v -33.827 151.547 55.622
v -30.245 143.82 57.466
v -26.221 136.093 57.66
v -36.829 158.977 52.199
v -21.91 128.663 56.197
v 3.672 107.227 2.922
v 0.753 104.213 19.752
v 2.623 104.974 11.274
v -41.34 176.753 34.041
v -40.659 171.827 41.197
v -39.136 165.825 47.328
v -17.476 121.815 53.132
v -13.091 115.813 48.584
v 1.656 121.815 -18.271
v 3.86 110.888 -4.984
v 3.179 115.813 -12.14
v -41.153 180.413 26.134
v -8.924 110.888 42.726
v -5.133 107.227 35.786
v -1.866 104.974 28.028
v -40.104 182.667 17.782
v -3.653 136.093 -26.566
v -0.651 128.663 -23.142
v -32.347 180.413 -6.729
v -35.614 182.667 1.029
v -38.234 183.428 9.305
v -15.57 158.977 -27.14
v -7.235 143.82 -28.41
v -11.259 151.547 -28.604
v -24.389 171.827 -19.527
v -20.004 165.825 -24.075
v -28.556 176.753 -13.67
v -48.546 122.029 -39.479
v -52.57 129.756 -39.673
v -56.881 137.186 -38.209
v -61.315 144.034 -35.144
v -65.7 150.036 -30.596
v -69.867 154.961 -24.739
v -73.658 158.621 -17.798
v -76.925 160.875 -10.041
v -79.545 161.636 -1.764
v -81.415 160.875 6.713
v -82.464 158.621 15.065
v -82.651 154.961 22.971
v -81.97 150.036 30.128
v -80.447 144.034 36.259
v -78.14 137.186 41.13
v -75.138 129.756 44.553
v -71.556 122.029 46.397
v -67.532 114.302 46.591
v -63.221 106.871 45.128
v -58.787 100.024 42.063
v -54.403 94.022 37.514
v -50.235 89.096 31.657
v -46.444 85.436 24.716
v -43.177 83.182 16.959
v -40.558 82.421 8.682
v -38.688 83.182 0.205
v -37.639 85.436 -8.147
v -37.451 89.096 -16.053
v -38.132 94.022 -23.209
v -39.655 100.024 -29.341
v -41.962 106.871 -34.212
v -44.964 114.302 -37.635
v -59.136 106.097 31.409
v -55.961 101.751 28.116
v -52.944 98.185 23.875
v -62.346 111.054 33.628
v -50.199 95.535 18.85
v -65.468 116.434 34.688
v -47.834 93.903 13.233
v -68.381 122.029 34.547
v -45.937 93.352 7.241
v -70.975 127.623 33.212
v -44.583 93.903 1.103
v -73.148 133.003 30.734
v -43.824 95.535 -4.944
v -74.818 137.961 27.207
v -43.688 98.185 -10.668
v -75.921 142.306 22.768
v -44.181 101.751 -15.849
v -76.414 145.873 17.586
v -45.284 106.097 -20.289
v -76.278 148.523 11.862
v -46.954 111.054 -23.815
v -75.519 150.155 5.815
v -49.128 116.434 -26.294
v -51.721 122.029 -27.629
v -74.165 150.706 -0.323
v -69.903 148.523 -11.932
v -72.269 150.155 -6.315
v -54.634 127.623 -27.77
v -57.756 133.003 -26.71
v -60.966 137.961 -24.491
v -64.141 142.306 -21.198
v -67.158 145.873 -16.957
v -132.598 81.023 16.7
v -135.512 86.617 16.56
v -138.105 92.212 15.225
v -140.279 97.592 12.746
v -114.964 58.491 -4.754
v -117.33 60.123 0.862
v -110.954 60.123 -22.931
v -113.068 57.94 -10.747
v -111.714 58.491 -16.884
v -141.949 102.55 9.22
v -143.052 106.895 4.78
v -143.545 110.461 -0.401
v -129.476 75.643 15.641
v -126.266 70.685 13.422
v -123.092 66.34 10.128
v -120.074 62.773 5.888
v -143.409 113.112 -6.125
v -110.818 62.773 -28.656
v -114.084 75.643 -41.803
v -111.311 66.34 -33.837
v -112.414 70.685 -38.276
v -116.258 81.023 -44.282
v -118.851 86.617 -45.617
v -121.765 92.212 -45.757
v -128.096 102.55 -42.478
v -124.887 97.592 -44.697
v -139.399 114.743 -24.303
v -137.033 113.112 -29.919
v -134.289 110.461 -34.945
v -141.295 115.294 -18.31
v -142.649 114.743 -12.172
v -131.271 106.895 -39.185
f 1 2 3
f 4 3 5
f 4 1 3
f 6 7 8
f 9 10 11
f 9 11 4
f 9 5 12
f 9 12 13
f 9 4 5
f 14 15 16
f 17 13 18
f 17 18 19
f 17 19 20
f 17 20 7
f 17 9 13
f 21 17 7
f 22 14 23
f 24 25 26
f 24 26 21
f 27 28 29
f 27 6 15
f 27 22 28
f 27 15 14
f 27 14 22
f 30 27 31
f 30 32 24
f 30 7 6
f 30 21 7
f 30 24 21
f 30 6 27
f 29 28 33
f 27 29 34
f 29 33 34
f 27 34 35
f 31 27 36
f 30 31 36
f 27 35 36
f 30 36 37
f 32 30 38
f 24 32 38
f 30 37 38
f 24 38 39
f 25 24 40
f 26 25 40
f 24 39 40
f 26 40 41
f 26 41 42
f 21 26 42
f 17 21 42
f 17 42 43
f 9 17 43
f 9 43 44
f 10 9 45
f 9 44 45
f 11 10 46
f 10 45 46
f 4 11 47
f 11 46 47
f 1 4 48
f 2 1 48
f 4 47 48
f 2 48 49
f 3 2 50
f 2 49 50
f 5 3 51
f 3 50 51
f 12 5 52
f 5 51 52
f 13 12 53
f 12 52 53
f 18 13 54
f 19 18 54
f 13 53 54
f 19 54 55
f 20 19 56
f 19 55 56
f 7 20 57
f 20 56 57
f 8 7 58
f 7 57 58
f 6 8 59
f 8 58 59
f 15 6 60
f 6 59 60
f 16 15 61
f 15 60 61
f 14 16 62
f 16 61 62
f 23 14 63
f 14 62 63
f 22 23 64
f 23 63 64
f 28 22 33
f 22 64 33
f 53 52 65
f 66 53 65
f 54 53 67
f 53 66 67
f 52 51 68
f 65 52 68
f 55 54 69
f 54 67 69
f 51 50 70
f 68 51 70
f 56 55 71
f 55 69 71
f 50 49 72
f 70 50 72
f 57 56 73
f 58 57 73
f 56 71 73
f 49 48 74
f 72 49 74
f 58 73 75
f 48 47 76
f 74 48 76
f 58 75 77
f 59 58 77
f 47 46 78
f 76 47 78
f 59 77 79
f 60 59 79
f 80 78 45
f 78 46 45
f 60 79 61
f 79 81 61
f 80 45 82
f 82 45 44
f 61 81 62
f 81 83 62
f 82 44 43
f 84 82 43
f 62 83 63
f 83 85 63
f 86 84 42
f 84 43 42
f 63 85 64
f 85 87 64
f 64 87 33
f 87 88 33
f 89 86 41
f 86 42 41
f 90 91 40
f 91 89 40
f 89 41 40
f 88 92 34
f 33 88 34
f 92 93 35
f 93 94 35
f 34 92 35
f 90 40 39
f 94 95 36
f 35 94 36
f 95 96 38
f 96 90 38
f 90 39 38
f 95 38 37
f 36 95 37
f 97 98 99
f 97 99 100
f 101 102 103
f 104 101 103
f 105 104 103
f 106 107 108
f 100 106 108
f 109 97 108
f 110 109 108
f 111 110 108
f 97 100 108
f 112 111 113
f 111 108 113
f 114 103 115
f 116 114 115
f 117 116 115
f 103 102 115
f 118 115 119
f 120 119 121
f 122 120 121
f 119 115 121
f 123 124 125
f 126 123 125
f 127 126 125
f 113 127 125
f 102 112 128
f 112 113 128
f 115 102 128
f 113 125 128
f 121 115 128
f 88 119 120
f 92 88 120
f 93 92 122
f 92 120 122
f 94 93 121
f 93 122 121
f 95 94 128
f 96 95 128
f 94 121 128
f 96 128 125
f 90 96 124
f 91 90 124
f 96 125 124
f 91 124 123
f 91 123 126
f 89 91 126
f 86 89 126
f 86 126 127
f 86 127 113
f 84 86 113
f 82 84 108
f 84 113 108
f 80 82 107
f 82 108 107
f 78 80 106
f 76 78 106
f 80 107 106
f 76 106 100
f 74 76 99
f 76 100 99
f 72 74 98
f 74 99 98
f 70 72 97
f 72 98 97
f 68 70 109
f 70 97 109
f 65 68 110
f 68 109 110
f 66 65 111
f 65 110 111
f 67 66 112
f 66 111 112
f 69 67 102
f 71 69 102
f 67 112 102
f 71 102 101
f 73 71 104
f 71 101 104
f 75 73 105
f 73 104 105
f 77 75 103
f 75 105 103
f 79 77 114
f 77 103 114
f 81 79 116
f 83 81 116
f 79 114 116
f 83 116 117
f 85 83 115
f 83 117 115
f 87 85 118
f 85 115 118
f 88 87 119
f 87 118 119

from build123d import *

# Parameters (mm, degrees)
SKETCH2_R             = 32.184938318
BOSS_EXTRUDE1_DEPTH   = 78
SKETCH3_R             = 44.452761075
BOSS_EXTRUDE2_DEPTH   = 48
BODY_MOVE_COPY2_ANGLE = 94.867085016


with BuildPart() as part:
    # Sketch2 → Boss-Extrude1 (new body)
    with BuildSketch(Plane(origin=(0, 0, 0), x_dir=(1, 0, 0), z_dir=(0, 1, 0))):
        Circle(SKETCH2_R)
    extrude(amount=BOSS_EXTRUDE1_DEPTH)

    # Sketch3 → Boss-Extrude2 (add)
    with BuildSketch(Plane(origin=(0, 78, 0), x_dir=(1, 0, 0), z_dir=(0, 1, 0))):
        Circle(SKETCH3_R)
    extrude(amount=BOSS_EXTRUDE2_DEPTH)


with BuildPart() as part_1:
    # Body-Move/Copy1: moved
    add(part.part.moved(Location((-72.960744445, 52.218831428, 0))))


with BuildPart() as part_2:
    # Body-Move/Copy2: moved
    add(part_1.part.moved(Location((0, 0, 0))).rotate(Axis((-95.551423715, 86.931599726, 17.334437881), (0.562837469, 0.704764727, -0.43188038)), BODY_MOVE_COPY2_ANGLE))


solid = part_2.part
